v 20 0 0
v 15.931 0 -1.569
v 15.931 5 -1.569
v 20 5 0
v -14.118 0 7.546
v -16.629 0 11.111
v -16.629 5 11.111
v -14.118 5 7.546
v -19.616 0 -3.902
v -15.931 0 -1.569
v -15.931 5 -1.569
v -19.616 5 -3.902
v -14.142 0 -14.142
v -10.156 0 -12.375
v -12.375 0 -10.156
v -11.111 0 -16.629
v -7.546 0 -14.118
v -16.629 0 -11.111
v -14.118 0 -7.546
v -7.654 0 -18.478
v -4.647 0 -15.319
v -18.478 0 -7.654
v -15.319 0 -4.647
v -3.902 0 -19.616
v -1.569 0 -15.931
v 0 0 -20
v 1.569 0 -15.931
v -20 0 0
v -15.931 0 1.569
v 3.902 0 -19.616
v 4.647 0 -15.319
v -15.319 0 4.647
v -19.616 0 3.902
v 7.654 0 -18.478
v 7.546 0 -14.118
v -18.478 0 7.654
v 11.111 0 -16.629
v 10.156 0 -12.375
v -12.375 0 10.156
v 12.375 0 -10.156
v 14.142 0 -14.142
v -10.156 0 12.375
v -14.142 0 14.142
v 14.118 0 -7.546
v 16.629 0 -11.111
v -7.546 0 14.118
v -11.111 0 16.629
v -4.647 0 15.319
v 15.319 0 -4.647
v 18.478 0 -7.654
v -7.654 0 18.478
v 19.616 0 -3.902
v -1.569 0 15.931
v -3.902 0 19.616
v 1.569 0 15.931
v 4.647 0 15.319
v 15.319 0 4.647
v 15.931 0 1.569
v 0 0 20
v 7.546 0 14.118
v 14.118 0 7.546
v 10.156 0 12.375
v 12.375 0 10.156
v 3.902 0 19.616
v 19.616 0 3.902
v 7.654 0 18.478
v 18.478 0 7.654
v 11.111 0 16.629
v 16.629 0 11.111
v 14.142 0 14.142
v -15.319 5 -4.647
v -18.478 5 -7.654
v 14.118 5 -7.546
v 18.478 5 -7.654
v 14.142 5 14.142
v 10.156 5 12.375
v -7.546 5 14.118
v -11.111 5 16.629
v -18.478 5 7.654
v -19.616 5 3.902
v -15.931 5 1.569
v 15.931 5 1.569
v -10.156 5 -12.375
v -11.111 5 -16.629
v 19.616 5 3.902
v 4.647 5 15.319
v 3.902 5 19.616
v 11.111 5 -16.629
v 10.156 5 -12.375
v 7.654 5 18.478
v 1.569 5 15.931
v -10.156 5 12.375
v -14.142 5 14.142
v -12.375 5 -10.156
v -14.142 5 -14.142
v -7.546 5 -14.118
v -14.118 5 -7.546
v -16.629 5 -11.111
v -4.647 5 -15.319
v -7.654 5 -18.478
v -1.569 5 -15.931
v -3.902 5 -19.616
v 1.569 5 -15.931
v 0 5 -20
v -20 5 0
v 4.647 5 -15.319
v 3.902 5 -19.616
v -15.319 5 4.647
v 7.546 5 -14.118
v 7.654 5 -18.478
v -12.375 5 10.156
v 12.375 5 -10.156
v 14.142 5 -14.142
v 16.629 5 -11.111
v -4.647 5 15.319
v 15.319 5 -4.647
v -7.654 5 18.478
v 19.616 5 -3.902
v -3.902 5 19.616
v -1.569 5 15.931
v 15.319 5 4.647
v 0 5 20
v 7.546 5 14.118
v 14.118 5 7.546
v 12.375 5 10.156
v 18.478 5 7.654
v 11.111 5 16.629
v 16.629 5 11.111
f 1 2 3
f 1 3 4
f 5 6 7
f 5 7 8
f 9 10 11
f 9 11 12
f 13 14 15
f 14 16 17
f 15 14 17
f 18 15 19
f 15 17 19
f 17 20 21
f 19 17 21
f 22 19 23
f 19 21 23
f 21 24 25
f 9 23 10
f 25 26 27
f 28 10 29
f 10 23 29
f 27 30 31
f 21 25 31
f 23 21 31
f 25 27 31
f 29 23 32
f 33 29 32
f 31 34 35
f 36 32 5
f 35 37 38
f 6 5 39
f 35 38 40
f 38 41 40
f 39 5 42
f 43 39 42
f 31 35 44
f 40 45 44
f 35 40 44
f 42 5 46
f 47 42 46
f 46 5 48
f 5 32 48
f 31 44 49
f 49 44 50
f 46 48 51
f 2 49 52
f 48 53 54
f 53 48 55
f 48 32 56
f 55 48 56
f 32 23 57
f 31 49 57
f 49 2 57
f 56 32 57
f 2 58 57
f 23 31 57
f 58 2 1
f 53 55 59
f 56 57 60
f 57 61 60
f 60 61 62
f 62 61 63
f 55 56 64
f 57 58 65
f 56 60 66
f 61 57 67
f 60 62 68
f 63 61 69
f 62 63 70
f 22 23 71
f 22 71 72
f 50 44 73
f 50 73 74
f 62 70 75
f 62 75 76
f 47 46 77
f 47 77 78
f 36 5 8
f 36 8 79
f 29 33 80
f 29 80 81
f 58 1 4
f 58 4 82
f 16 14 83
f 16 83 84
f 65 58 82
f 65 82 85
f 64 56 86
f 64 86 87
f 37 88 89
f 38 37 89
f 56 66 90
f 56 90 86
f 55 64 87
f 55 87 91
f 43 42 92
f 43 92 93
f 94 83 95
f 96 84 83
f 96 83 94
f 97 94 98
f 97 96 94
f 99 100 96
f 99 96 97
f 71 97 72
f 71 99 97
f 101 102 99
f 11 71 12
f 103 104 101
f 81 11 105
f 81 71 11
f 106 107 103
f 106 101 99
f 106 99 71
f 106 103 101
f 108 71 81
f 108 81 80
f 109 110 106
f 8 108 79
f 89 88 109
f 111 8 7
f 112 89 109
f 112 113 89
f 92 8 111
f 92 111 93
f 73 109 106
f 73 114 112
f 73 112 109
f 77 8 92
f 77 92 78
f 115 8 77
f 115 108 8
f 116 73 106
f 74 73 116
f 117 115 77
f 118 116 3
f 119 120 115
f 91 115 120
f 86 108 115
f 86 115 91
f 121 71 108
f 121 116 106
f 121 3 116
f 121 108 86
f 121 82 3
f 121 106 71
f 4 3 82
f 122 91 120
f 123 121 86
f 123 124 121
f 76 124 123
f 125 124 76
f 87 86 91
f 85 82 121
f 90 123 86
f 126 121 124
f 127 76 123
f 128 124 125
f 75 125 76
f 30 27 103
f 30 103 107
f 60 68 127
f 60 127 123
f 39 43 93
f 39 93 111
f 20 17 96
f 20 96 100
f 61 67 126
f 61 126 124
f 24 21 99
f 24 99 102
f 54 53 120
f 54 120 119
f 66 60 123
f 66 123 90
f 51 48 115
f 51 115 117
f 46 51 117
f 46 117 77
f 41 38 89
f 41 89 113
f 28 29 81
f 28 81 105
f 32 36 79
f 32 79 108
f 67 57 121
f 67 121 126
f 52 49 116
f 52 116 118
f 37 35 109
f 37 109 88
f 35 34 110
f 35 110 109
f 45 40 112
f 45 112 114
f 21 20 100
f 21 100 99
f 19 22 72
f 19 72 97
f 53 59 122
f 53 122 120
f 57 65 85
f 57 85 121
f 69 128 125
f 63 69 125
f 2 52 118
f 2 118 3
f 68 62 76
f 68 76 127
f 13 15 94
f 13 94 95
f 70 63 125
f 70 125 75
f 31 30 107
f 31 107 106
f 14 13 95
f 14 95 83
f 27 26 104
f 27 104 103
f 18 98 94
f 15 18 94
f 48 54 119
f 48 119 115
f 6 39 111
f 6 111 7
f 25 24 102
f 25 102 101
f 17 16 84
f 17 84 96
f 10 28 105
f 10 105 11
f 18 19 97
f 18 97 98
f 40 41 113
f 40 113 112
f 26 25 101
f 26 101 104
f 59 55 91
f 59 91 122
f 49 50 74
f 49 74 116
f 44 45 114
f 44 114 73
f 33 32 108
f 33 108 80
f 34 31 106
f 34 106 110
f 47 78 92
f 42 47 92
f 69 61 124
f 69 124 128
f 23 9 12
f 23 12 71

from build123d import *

# Parameters (mm, degrees)
ESQUISSE1_R             = 20
BOSS_EXTRU_1_DEPTH      = 5
ENL_V_START             = -5
ENL_V_MAT_EXTRU_1_DEPTH = 5


with BuildPart() as part:
    # Esquisse1 → Boss.-Extru.1 (new body)
    with BuildSketch(Plane(origin=(0, 0, 0), x_dir=(1, 0, 0), z_dir=(0, 1, 0))):
        with Locations(Location((0, 0, 0), (0, 0, 270))):
            Circle(ESQUISSE1_R)
    extrude(amount=BOSS_EXTRU_1_DEPTH)

    # Esquisse2 → Enlèv. mat.-Extru.1 (cut)
    with BuildSketch(Plane(origin=(0, 5, 0), x_dir=(1, 0, 0), z_dir=(0, 1, 0)).offset(ENL_V_START)):
        with BuildLine():
            Line((-4.64704136, 15.319242341), (-3.90180644, 19.615705608))
            ThreePointArc((-3.90180644, 19.615705608), (-5.805693545, 19.138806715), (-7.653668647, 18.47759065))
            Line((-7.653668647, 18.47759065), (-4.64704136, 15.319242341))
        make_face()
        with BuildLine():
            Line((-1.569113842, 15.931480191), (0, 20))
            ThreePointArc((0, 20), (-1.960342807, 19.903694533), (-3.90180644, 19.615705608))
            Line((-3.90180644, 19.615705608), (-1.569113842, 15.931480191))
        make_face()
        with BuildLine():
            ThreePointArc((3.90180644, 19.615705608), (1.960342807, 19.903694533), (0, 20))
            Line((0, 20), (1.569113842, 15.931480191))
            Line((1.569113842, 15.931480191), (3.90180644, 19.615705608))
        make_face()
        with BuildLine():
            ThreePointArc((7.653668647, 18.47759065), (5.805693545, 19.138806715), (3.90180644, 19.615705608))
            Line((3.90180644, 19.615705608), (4.64704136, 15.319242341))
            Line((4.64704136, 15.319242341), (7.653668647, 18.47759065))
        make_face()
        with BuildLine():
            ThreePointArc((11.11140466, 16.629392246), (9.427934737, 17.638425287), (7.653668647, 18.47759065))
            Line((7.653668647, 18.47759065), (7.546385684, 14.1182946))
            Line((7.546385684, 14.1182946), (11.11140466, 16.629392246))
        make_face()
        with BuildLine():
            ThreePointArc((14.142135624, 14.142135624), (12.687865683, 15.460209067), (11.11140466, 16.629392246))
            Line((11.11140466, 16.629392246), (10.155726639, 12.374788715))
            Line((10.155726639, 12.374788715), (14.142135624, 14.142135624))
        make_face()
        with BuildLine():
            ThreePointArc((16.629392246, 11.11140466), (15.460209067, 12.687865683), (14.142135624, 14.142135624))
            Line((14.142135624, 14.142135624), (12.374788715, 10.155726639))
            Line((12.374788715, 10.155726639), (16.629392246, 11.11140466))
        make_face()
        with BuildLine():
            ThreePointArc((18.47759065, 7.653668647), (17.638425287, 9.427934737), (16.629392246, 11.11140466))
            Line((16.629392246, 11.11140466), (14.1182946, 7.546385684))
            Line((14.1182946, 7.546385684), (18.47759065, 7.653668647))
        make_face()
        with BuildLine():
            ThreePointArc((19.615705608, 3.90180644), (19.138806715, 5.805693545), (18.47759065, 7.653668647))
            Line((18.47759065, 7.653668647), (15.319242341, 4.64704136))
            Line((15.319242341, 4.64704136), (19.615705608, 3.90180644))
        make_face()
        with BuildLine():
            ThreePointArc((20, 0), (19.903694533, 1.960342807), (19.615705608, 3.90180644))
            Line((19.615705608, 3.90180644), (15.931480191, 1.569113842))
            Line((15.931480191, 1.569113842), (20, 0))
        make_face()
        with BuildLine():
            ThreePointArc((19.615705608, -3.90180644), (19.903694533, -1.960342807), (20, 0))
            Line((20, 0), (15.931480191, -1.569113842))
            Line((15.931480191, -1.569113842), (19.615705608, -3.90180644))
        make_face()
        with BuildLine():
            ThreePointArc((18.47759065, -7.653668647), (19.138806715, -5.805693545), (19.615705608, -3.90180644))
            Line((19.615705608, -3.90180644), (15.319242341, -4.64704136))
            Line((15.319242341, -4.64704136), (18.47759065, -7.653668647))
        make_face()
        with BuildLine():
            Line((-7.546385684, 14.1182946), (-7.653668647, 18.47759065))
            ThreePointArc((-7.653668647, 18.47759065), (-9.427934737, 17.638425287), (-11.11140466, 16.629392246))
            Line((-11.11140466, 16.629392246), (-7.546385684, 14.1182946))
        make_face()
        with BuildLine():
            Line((-10.155726639, 12.374788715), (-11.11140466, 16.629392246))
            ThreePointArc((-11.11140466, 16.629392246), (-12.687865683, 15.460209067), (-14.142135624, 14.142135624))
            Line((-14.142135624, 14.142135624), (-10.155726639, 12.374788715))
        make_face()
        with BuildLine():
            Line((-12.374788715, 10.155726639), (-14.142135624, 14.142135624))
            ThreePointArc((-14.142135624, 14.142135624), (-15.460209067, 12.687865683), (-16.629392246, 11.11140466))
            Line((-16.629392246, 11.11140466), (-12.374788715, 10.155726639))
        make_face()
        with BuildLine():
            Line((-14.1182946, 7.546385684), (-16.629392246, 11.11140466))
            ThreePointArc((-16.629392246, 11.11140466), (-17.638425287, 9.427934737), (-18.47759065, 7.653668647))
            Line((-18.47759065, 7.653668647), (-14.1182946, 7.546385684))
        make_face()
        with BuildLine():
            Line((-15.319242341, 4.64704136), (-18.47759065, 7.653668647))
            ThreePointArc((-18.47759065, 7.653668647), (-19.138806715, 5.805693545), (-19.615705608, 3.90180644))
            Line((-19.615705608, 3.90180644), (-15.319242341, 4.64704136))
        make_face()
        with BuildLine():
            Line((-15.931480191, 1.569113842), (-19.615705608, 3.90180644))
            ThreePointArc((-19.615705608, 3.90180644), (-19.903694533, 1.960342807), (-20, 0))
            Line((-20, 0), (-15.931480191, 1.569113842))
        make_face()
        with BuildLine():
            Line((-15.931480191, -1.569113842), (-20, 0))
            ThreePointArc((-20, 0), (-19.903694533, -1.960342807), (-19.615705608, -3.90180644))
            Line((-19.615705608, -3.90180644), (-15.931480191, -1.569113842))
        make_face()
        with BuildLine():
            Line((-15.319242341, -4.64704136), (-19.615705608, -3.90180644))
            ThreePointArc((-19.615705608, -3.90180644), (-19.138806715, -5.805693545), (-18.47759065, -7.653668647))
            Line((-18.47759065, -7.653668647), (-15.319242341, -4.64704136))
        make_face()
        with BuildLine():
            Line((-14.1182946, -7.546385684), (-18.47759065, -7.653668647))
            ThreePointArc((-18.47759065, -7.653668647), (-17.638425287, -9.427934737), (-16.629392246, -11.11140466))
            Line((-16.629392246, -11.11140466), (-14.1182946, -7.546385684))
        make_face()
        with BuildLine():
            Line((-12.374788715, -10.155726639), (-16.629392246, -11.11140466))
            ThreePointArc((-16.629392246, -11.11140466), (-15.460209067, -12.687865683), (-14.142135624, -14.142135624))
            Line((-14.142135624, -14.142135624), (-12.374788715, -10.155726639))
        make_face()
        with BuildLine():
            Line((-10.155726639, -12.374788715), (-14.142135624, -14.142135624))
            ThreePointArc((-14.142135624, -14.142135624), (-12.687865683, -15.460209067), (-11.11140466, -16.629392246))
            Line((-11.11140466, -16.629392246), (-10.155726639, -12.374788715))
        make_face()
        with BuildLine():
            Line((-7.546385684, -14.1182946), (-11.11140466, -16.629392246))
            ThreePointArc((-11.11140466, -16.629392246), (-9.427934737, -17.638425287), (-7.653668647, -18.47759065))
            Line((-7.653668647, -18.47759065), (-7.546385684, -14.1182946))
        make_face()
        with BuildLine():
            Line((-4.64704136, -15.319242341), (-7.653668647, -18.47759065))
            ThreePointArc((-7.653668647, -18.47759065), (-5.805693545, -19.138806715), (-3.90180644, -19.615705608))
            Line((-3.90180644, -19.615705608), (-4.64704136, -15.319242341))
        make_face()
        with BuildLine():
            Line((-1.569113842, -15.931480191), (-3.90180644, -19.615705608))
            ThreePointArc((-3.90180644, -19.615705608), (-1.960342807, -19.903694533), (0, -20))
            Line((0, -20), (-1.569113842, -15.931480191))
        make_face()
        with BuildLine():
            ThreePointArc((0, -20), (1.960342807, -19.903694533), (3.90180644, -19.615705608))
            Line((3.90180644, -19.615705608), (1.569113842, -15.931480191))
            Line((1.569113842, -15.931480191), (0, -20))
        make_face()
        with BuildLine():
            ThreePointArc((3.90180644, -19.615705608), (5.805693545, -19.138806715), (7.653668647, -18.47759065))
            Line((7.653668647, -18.47759065), (4.64704136, -15.319242341))
            Line((4.64704136, -15.319242341), (3.90180644, -19.615705608))
        make_face()
        with BuildLine():
            ThreePointArc((7.653668647, -18.47759065), (9.427934737, -17.638425287), (11.11140466, -16.629392246))
            Line((11.11140466, -16.629392246), (7.546385684, -14.1182946))
            Line((7.546385684, -14.1182946), (7.653668647, -18.47759065))
        make_face()
        with BuildLine():
            ThreePointArc((11.11140466, -16.629392246), (12.687865683, -15.460209067), (14.142135624, -14.142135624))
            Line((14.142135624, -14.142135624), (10.155726639, -12.374788715))
            Line((10.155726639, -12.374788715), (11.11140466, -16.629392246))
        make_face()
        with BuildLine():
            ThreePointArc((14.142135624, -14.142135624), (15.460209067, -12.687865683), (16.629392246, -11.11140466))
            Line((16.629392246, -11.11140466), (12.374788715, -10.155726639))
            Line((12.374788715, -10.155726639), (14.142135624, -14.142135624))
        make_face()
        with BuildLine():
            ThreePointArc((16.629392246, -11.11140466), (17.638425287, -9.427934737), (18.47759065, -7.653668647))
            Line((18.47759065, -7.653668647), (14.1182946, -7.546385684))
            Line((14.1182946, -7.546385684), (16.629392246, -11.11140466))
        make_face()
    extrude(amount=ENL_V_MAT_EXTRU_1_DEPTH, mode=Mode.SUBTRACT)


solid = part.part
